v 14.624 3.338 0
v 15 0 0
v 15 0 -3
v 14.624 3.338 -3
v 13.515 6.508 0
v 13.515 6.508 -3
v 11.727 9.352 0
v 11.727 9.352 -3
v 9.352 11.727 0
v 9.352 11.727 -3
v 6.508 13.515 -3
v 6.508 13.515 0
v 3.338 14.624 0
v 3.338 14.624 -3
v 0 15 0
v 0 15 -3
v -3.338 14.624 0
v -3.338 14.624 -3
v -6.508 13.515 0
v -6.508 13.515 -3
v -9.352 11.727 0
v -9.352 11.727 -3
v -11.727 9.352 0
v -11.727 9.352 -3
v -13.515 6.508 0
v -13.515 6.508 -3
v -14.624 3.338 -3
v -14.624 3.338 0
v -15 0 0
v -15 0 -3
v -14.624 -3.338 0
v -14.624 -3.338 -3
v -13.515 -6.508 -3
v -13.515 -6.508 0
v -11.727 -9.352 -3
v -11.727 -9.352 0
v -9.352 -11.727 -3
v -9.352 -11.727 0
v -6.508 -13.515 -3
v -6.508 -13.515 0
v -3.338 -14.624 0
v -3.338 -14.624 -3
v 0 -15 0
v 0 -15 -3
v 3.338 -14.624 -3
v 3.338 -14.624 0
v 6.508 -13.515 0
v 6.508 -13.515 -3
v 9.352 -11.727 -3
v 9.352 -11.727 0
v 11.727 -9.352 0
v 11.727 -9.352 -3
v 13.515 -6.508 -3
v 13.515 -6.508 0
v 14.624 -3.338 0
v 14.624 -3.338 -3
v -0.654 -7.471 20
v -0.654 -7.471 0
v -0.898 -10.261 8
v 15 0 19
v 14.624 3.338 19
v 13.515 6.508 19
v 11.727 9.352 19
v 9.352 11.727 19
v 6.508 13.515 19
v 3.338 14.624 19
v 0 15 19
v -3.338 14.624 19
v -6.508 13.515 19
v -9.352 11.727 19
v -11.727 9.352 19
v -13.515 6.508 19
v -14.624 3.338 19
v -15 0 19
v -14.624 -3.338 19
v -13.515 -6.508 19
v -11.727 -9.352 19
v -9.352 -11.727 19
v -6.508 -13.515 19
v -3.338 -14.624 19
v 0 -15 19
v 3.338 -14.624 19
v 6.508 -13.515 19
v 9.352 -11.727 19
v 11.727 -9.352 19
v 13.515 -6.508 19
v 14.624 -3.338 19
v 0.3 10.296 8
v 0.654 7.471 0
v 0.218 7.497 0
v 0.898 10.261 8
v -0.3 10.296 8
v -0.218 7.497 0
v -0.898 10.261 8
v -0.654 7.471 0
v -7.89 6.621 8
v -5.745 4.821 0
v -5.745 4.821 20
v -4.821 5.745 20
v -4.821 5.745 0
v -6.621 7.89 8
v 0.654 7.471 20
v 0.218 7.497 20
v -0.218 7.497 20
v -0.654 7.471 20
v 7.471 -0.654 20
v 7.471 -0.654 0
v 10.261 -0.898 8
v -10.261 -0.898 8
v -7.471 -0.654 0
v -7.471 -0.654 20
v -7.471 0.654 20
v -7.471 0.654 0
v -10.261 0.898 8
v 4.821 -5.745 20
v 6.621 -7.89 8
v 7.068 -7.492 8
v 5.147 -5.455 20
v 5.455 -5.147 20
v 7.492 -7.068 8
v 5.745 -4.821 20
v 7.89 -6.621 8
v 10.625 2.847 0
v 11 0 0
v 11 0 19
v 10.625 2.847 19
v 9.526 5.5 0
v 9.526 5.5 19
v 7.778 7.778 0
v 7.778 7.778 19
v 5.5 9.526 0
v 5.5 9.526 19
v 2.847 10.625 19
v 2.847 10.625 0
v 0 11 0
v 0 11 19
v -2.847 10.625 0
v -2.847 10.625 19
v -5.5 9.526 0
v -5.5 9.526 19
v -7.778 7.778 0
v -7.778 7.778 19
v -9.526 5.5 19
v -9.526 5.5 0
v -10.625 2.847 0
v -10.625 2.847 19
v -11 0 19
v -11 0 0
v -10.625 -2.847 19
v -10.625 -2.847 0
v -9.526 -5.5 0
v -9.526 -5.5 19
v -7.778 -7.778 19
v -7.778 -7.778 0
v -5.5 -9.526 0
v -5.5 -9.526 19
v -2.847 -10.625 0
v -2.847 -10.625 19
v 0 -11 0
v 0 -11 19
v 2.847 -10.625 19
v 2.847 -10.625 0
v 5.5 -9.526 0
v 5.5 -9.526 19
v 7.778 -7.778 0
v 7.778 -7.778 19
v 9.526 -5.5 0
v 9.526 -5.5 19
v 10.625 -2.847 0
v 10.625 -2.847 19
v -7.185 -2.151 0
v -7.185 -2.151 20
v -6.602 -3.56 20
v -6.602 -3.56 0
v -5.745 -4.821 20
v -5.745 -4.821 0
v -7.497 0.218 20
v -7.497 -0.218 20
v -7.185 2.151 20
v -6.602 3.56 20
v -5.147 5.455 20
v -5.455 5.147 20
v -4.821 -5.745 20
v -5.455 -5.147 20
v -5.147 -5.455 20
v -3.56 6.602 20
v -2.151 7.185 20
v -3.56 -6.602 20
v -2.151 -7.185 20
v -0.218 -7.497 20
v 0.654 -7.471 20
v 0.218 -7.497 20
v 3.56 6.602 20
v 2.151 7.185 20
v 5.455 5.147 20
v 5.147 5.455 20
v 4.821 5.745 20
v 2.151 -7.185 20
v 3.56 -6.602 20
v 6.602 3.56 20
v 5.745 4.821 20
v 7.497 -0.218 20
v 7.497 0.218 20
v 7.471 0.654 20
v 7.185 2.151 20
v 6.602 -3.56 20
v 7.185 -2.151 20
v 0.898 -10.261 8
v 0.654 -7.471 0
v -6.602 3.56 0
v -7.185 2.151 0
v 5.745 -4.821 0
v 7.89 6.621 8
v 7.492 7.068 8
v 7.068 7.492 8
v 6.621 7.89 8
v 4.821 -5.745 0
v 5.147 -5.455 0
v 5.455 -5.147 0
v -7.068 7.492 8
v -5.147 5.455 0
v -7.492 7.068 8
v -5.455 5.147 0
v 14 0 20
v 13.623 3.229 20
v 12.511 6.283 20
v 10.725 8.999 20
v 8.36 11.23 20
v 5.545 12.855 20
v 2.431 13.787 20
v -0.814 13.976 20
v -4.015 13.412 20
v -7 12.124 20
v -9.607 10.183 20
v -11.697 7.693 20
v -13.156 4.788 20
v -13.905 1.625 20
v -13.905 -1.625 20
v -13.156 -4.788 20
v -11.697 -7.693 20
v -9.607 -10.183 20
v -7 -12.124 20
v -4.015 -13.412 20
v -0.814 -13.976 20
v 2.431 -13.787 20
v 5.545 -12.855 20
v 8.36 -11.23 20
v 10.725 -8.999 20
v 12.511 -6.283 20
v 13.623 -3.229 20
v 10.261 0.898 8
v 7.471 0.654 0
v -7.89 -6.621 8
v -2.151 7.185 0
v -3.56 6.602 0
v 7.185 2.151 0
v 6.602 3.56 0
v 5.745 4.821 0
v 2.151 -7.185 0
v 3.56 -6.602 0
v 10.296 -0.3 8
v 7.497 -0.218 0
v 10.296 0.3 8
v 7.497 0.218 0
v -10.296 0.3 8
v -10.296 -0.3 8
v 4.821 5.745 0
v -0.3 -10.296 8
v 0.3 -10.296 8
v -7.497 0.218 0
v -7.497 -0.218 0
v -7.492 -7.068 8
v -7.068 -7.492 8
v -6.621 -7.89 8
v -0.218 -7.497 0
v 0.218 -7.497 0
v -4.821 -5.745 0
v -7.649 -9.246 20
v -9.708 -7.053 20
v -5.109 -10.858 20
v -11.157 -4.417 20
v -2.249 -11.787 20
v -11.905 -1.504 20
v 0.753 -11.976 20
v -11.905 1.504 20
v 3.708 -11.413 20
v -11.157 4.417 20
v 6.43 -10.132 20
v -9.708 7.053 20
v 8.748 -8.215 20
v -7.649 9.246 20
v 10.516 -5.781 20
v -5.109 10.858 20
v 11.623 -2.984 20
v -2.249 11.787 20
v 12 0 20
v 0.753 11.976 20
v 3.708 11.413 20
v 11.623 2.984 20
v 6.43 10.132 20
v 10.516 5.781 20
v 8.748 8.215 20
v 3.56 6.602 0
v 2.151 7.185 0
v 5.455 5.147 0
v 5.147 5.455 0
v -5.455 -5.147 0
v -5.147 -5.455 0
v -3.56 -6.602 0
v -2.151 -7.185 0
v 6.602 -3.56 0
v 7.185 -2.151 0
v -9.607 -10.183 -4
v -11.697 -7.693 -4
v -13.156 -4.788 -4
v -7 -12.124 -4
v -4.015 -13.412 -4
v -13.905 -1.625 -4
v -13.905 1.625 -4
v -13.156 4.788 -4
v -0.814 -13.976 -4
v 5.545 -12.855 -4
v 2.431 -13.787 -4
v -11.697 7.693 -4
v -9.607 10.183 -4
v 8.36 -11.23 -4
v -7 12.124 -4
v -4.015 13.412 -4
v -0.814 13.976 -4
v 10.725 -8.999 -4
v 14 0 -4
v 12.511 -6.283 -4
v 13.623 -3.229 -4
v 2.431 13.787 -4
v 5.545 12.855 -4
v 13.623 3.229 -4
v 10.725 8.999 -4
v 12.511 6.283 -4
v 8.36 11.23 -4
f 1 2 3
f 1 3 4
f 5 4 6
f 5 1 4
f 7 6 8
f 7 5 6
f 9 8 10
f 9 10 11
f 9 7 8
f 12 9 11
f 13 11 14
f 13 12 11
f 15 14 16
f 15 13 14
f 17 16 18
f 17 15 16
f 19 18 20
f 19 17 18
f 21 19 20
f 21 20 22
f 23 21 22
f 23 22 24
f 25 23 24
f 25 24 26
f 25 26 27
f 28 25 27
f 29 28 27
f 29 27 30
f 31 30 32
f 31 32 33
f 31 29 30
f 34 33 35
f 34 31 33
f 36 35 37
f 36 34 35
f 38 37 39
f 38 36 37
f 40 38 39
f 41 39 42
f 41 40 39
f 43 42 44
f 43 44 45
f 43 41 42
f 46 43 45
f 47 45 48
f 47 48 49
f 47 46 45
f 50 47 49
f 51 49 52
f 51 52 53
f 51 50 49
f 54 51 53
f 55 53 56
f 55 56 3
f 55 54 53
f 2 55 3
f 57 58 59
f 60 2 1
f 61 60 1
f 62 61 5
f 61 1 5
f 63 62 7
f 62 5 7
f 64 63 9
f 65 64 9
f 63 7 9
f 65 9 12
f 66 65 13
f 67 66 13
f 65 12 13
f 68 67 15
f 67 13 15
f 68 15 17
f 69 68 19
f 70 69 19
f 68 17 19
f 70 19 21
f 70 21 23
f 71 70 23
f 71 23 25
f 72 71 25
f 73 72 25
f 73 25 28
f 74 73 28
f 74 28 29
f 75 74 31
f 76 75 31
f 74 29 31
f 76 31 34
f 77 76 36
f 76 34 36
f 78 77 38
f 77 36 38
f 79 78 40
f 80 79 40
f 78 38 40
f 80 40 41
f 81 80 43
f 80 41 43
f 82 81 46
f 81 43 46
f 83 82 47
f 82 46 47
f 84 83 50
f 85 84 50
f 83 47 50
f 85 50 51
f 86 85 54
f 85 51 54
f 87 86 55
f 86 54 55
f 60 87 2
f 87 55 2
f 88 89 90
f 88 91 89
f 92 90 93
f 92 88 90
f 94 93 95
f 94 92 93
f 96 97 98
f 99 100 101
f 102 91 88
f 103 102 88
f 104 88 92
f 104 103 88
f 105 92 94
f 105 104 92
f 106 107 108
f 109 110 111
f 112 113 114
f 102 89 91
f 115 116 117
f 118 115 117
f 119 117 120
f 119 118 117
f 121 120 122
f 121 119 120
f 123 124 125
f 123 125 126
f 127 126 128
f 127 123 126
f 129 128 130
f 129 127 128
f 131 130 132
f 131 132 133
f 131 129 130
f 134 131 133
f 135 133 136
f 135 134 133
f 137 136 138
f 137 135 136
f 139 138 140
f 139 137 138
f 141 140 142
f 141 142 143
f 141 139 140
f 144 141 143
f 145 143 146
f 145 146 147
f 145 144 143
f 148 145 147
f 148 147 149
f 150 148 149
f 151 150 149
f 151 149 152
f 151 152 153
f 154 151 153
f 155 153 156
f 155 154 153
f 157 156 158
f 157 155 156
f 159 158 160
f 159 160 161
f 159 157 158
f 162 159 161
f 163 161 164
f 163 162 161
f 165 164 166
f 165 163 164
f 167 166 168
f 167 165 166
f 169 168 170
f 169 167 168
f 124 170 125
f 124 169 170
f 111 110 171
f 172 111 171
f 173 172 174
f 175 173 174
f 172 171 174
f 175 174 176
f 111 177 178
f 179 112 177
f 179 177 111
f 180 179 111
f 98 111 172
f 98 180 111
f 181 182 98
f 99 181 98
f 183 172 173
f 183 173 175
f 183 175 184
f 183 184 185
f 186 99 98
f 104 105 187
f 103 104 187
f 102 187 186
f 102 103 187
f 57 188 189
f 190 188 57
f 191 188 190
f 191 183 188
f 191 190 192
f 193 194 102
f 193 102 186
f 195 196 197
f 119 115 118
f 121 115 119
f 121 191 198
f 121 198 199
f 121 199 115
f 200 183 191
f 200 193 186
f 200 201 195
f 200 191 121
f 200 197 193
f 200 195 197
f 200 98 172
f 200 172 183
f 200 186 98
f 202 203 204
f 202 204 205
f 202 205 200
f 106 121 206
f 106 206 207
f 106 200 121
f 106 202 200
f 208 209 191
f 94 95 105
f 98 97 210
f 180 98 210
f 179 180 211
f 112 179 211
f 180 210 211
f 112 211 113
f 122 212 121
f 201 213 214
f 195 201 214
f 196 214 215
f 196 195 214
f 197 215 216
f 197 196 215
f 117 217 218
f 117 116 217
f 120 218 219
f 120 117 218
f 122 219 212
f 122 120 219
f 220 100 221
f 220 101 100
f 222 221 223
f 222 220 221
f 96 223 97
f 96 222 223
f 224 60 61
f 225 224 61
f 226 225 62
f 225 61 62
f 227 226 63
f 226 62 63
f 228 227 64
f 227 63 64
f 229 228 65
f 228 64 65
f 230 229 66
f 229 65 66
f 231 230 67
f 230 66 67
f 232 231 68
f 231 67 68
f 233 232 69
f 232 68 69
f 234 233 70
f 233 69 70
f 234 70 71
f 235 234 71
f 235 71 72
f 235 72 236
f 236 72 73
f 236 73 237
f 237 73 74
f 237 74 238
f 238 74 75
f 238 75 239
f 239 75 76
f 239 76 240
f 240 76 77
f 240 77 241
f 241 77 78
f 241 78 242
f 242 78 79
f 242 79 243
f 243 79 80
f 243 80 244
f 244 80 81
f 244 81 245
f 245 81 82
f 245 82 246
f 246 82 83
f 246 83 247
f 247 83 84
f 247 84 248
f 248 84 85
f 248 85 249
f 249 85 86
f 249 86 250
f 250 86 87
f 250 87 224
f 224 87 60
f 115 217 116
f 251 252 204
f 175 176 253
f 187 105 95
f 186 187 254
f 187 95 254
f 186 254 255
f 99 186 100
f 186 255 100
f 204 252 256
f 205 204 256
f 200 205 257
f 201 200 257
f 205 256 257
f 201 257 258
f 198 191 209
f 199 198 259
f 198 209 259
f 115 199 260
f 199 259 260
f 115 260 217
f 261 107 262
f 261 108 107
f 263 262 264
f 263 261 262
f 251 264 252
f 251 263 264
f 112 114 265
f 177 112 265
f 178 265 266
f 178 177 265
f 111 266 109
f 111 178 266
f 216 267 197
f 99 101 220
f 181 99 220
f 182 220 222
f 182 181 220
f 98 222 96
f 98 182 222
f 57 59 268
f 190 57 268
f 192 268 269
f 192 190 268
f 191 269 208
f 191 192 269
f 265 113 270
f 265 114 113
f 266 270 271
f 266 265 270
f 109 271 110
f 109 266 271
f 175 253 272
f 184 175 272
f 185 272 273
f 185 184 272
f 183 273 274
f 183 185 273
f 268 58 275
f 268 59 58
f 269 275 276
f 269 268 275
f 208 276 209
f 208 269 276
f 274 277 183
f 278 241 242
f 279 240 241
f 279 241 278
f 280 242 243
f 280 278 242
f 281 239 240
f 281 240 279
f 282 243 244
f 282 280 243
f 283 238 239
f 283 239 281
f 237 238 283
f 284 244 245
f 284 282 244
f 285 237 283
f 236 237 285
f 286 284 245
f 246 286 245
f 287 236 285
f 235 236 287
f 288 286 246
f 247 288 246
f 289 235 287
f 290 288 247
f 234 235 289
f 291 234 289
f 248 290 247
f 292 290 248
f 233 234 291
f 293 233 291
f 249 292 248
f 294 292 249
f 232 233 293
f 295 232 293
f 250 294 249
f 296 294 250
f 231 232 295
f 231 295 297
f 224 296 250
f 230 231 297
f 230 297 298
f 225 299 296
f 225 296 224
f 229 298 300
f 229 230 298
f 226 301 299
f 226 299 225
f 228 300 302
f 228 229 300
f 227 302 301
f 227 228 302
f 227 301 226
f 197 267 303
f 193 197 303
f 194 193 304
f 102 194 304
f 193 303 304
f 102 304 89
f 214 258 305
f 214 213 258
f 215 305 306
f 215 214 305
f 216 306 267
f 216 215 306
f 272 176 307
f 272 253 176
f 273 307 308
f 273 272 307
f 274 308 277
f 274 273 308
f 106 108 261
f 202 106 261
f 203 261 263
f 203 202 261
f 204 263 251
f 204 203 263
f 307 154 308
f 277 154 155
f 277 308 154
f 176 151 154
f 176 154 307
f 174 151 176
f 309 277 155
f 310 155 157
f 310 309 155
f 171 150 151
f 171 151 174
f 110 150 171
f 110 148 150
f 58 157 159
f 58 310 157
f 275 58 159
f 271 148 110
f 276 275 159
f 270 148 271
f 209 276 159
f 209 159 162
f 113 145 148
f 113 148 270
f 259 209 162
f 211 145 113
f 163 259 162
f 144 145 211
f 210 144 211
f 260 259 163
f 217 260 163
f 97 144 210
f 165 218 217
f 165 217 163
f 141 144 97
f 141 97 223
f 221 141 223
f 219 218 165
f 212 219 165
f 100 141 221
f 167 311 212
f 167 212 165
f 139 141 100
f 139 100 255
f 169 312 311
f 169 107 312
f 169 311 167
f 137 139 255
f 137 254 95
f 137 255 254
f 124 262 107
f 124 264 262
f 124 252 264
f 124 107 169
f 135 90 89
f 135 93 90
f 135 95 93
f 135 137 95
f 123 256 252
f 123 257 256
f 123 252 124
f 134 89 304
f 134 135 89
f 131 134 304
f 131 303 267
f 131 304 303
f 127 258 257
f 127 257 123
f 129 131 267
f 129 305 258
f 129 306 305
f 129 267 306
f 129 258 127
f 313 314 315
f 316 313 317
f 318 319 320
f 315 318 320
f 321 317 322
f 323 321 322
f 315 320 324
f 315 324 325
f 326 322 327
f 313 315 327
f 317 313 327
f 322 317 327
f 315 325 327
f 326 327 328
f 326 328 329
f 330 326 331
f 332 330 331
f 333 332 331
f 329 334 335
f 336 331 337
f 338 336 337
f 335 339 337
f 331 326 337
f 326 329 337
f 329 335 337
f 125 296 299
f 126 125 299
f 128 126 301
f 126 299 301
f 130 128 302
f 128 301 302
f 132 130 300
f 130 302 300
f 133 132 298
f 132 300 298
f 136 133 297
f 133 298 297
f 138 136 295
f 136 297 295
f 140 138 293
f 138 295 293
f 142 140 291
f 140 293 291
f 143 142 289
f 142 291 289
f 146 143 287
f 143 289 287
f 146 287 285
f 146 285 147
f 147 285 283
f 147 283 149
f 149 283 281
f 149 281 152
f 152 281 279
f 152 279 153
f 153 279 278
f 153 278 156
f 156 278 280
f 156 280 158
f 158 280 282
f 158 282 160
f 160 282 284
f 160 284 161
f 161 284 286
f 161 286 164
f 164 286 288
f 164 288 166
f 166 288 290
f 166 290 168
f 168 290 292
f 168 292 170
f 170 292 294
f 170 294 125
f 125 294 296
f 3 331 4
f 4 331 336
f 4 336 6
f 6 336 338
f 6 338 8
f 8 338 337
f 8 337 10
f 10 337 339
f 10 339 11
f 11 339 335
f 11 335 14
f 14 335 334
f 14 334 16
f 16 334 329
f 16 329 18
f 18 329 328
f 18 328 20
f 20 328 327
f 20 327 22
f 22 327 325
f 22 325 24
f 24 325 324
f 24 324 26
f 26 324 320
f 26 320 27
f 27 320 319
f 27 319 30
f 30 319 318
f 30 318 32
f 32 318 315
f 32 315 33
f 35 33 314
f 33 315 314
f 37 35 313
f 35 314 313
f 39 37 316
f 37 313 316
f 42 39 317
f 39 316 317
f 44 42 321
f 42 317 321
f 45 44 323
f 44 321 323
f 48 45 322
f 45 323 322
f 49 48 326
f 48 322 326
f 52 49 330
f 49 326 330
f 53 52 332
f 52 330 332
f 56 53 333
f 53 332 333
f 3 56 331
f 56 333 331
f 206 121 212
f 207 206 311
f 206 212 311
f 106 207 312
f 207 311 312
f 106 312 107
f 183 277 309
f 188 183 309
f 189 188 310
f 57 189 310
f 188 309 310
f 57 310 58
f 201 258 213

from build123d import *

# Parameters (mm, degrees)
F0_R            = 15
F0_R_2          = 11
F0_R_3          = 7.5
F1_DEPTH        = 4
F2_DEPTH        = 20
F4_ANGLE_BACK   = 5
F4_ANGLE        = 10
F4_COPIES_COUNT = 8
F5_SIZE         = 1


# Not quite as in the source:
# - a pattern or mirror of a feature is missing from the dataset's text; its kind, count and spacing are read off the source's solid


with BuildPart() as f1:
    # F0 (on Top) → F1 (new body)
    with BuildSketch(Plane.XY):
        Circle(F0_R)
        Circle(F0_R_2, mode=Mode.SUBTRACT)
        Circle(F0_R_2)
        Circle(F0_R_3, mode=Mode.SUBTRACT)
        Circle(F0_R_3)
    extrude(amount=-F1_DEPTH)

    # F0 (on Top) → F2 (join)
    with BuildSketch(Plane.XY):
        Circle(F0_R)
        Circle(F0_R_2, mode=Mode.SUBTRACT)
        Circle(F0_R_3)
    extrude(amount=F2_DEPTH)

    # F3 (on Front) → F4 (revolve)
    with BuildSketch(Plane.XZ, mode=Mode.PRIVATE) as f4_sk:
        Polygon((0, 20), (0, 0), (7.5, 0), (10.3, 8), (7.5, 20), align=None)
    f4 = revolve(f4_sk.sketch.rotate(Axis((0, 0, 10), (0, 0, 1)), -F4_ANGLE_BACK), axis=Axis((0, 0, 10), (0, 0, 1)), revolution_arc=F4_ANGLE)

    # F4_copies: F4 ×8 about axis
    f4_copies_axis = Axis((0, 0, 0), (0, 0, 1))
    for i in range(1, F4_COPIES_COUNT):
        add(f4.rotate(f4_copies_axis, i * 360 / F4_COPIES_COUNT))

    # F5
    f5_edges = [f1.edges().sort_by_distance(p)[0] for p in [
        (-15, 0, 20),
        (-11, 0, 20),
        (-15, 0, -4),
    ]]
    chamfer(f5_edges, length=F5_SIZE)


solid = f1.part
